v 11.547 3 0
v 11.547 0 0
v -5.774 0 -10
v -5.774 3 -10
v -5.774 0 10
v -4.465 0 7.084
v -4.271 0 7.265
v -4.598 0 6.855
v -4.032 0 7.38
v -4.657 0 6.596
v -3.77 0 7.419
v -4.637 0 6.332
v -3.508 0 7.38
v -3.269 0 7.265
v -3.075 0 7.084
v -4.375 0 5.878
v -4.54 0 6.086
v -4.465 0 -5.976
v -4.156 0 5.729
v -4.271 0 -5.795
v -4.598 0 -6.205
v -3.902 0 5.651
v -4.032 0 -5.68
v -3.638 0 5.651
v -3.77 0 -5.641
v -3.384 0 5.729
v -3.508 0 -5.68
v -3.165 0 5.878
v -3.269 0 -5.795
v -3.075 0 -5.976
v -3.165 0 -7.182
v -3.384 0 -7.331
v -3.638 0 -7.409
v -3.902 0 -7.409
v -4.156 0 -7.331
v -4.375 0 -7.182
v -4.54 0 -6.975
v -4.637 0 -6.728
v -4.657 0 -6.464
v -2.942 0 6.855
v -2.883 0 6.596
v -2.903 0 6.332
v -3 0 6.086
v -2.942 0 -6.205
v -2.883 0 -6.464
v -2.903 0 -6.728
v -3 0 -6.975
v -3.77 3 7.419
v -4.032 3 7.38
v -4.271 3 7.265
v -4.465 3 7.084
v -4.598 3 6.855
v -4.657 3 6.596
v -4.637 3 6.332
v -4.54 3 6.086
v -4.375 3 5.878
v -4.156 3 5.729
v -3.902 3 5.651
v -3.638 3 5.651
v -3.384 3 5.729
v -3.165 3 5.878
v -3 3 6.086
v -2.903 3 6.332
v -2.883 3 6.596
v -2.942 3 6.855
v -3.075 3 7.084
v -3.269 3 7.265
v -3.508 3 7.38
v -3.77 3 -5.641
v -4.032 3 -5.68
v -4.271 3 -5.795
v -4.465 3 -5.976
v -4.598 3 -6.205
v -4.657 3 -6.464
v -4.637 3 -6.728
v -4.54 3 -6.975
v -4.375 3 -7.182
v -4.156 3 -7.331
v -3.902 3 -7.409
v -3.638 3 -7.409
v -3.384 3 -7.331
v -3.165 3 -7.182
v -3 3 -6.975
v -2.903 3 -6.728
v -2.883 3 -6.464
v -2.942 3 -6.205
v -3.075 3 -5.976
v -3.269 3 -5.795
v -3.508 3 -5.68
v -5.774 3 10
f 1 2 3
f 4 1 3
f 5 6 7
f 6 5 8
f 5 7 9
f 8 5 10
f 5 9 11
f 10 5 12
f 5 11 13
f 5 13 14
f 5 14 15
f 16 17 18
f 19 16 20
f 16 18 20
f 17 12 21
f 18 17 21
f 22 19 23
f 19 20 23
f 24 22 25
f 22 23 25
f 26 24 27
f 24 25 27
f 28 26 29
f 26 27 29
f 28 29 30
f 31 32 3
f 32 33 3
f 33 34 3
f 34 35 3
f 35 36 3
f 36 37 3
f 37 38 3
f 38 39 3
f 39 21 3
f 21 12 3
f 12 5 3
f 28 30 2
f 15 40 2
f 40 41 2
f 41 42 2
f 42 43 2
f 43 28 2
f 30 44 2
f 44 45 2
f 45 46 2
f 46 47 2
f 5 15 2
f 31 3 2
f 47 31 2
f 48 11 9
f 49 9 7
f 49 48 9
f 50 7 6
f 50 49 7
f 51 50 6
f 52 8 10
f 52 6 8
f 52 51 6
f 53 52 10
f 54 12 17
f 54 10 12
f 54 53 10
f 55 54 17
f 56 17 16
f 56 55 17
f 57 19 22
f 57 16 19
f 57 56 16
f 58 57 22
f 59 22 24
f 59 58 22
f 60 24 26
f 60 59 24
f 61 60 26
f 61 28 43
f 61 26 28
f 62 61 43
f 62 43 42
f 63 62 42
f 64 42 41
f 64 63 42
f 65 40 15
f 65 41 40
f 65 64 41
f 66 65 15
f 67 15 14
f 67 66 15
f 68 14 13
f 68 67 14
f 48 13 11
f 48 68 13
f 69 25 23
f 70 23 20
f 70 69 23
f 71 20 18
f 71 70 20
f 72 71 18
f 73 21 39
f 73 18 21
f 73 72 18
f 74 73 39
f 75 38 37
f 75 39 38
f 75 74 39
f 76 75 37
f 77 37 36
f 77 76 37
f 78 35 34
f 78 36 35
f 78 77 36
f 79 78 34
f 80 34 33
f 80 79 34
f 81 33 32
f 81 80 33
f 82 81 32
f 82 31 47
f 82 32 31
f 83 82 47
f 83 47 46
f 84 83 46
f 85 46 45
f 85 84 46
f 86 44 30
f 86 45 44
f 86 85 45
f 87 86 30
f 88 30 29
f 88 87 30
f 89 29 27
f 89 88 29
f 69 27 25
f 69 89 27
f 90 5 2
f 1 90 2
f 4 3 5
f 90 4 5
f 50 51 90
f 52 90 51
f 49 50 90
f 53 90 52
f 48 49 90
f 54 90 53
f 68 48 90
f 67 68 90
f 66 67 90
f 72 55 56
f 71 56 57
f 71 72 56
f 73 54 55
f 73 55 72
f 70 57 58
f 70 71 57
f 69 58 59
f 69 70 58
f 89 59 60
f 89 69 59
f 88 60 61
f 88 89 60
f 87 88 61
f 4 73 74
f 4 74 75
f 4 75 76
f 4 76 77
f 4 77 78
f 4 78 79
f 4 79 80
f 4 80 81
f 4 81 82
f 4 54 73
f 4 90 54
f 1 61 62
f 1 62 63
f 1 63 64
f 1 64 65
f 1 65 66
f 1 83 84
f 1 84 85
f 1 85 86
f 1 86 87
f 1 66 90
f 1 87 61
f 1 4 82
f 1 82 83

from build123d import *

# Parameters (mm, degrees)
EXTRUDE1_DEPTH  = 3
LPATTERN1_COUNT = 2
LPATTERN1_PITCH = 13.06


with BuildPart() as part:
    # Sketch1 → Extrude1 (new body)
    with BuildSketch(Plane(origin=(0, 0, 0), x_dir=(1, 0, 0), z_dir=(0, 1, 0))):
        Polygon((11.547005384, 0), (-5.773502692, 10), (-5.773502692, -10), align=None)
    extrude(amount=EXTRUDE1_DEPTH)

    # Sketch6 → #2-56 Tapped Hole1 (revolve, cut)
    with BuildSketch(Plane(origin=(-3.77, 3, -6.53), x_dir=(0, 0, 1), z_dir=(1, 0, 0))):
        Polygon((0, 0), (0, 7.17416509), (0.889, 6.64), (0.889, 0), align=None)
    f_2_56_tapped_hole1 = revolve(axis=Axis((-3.77, 9.35, -6.53), (0, -1, 0)), mode=Mode.SUBTRACT)

    # LPattern1: #2-56 Tapped Hole1 ×2
    with Locations(*[(0, 0, i * LPATTERN1_PITCH) for i in range(1, LPATTERN1_COUNT)]):
        add(f_2_56_tapped_hole1, mode=Mode.SUBTRACT)


solid = part.part
